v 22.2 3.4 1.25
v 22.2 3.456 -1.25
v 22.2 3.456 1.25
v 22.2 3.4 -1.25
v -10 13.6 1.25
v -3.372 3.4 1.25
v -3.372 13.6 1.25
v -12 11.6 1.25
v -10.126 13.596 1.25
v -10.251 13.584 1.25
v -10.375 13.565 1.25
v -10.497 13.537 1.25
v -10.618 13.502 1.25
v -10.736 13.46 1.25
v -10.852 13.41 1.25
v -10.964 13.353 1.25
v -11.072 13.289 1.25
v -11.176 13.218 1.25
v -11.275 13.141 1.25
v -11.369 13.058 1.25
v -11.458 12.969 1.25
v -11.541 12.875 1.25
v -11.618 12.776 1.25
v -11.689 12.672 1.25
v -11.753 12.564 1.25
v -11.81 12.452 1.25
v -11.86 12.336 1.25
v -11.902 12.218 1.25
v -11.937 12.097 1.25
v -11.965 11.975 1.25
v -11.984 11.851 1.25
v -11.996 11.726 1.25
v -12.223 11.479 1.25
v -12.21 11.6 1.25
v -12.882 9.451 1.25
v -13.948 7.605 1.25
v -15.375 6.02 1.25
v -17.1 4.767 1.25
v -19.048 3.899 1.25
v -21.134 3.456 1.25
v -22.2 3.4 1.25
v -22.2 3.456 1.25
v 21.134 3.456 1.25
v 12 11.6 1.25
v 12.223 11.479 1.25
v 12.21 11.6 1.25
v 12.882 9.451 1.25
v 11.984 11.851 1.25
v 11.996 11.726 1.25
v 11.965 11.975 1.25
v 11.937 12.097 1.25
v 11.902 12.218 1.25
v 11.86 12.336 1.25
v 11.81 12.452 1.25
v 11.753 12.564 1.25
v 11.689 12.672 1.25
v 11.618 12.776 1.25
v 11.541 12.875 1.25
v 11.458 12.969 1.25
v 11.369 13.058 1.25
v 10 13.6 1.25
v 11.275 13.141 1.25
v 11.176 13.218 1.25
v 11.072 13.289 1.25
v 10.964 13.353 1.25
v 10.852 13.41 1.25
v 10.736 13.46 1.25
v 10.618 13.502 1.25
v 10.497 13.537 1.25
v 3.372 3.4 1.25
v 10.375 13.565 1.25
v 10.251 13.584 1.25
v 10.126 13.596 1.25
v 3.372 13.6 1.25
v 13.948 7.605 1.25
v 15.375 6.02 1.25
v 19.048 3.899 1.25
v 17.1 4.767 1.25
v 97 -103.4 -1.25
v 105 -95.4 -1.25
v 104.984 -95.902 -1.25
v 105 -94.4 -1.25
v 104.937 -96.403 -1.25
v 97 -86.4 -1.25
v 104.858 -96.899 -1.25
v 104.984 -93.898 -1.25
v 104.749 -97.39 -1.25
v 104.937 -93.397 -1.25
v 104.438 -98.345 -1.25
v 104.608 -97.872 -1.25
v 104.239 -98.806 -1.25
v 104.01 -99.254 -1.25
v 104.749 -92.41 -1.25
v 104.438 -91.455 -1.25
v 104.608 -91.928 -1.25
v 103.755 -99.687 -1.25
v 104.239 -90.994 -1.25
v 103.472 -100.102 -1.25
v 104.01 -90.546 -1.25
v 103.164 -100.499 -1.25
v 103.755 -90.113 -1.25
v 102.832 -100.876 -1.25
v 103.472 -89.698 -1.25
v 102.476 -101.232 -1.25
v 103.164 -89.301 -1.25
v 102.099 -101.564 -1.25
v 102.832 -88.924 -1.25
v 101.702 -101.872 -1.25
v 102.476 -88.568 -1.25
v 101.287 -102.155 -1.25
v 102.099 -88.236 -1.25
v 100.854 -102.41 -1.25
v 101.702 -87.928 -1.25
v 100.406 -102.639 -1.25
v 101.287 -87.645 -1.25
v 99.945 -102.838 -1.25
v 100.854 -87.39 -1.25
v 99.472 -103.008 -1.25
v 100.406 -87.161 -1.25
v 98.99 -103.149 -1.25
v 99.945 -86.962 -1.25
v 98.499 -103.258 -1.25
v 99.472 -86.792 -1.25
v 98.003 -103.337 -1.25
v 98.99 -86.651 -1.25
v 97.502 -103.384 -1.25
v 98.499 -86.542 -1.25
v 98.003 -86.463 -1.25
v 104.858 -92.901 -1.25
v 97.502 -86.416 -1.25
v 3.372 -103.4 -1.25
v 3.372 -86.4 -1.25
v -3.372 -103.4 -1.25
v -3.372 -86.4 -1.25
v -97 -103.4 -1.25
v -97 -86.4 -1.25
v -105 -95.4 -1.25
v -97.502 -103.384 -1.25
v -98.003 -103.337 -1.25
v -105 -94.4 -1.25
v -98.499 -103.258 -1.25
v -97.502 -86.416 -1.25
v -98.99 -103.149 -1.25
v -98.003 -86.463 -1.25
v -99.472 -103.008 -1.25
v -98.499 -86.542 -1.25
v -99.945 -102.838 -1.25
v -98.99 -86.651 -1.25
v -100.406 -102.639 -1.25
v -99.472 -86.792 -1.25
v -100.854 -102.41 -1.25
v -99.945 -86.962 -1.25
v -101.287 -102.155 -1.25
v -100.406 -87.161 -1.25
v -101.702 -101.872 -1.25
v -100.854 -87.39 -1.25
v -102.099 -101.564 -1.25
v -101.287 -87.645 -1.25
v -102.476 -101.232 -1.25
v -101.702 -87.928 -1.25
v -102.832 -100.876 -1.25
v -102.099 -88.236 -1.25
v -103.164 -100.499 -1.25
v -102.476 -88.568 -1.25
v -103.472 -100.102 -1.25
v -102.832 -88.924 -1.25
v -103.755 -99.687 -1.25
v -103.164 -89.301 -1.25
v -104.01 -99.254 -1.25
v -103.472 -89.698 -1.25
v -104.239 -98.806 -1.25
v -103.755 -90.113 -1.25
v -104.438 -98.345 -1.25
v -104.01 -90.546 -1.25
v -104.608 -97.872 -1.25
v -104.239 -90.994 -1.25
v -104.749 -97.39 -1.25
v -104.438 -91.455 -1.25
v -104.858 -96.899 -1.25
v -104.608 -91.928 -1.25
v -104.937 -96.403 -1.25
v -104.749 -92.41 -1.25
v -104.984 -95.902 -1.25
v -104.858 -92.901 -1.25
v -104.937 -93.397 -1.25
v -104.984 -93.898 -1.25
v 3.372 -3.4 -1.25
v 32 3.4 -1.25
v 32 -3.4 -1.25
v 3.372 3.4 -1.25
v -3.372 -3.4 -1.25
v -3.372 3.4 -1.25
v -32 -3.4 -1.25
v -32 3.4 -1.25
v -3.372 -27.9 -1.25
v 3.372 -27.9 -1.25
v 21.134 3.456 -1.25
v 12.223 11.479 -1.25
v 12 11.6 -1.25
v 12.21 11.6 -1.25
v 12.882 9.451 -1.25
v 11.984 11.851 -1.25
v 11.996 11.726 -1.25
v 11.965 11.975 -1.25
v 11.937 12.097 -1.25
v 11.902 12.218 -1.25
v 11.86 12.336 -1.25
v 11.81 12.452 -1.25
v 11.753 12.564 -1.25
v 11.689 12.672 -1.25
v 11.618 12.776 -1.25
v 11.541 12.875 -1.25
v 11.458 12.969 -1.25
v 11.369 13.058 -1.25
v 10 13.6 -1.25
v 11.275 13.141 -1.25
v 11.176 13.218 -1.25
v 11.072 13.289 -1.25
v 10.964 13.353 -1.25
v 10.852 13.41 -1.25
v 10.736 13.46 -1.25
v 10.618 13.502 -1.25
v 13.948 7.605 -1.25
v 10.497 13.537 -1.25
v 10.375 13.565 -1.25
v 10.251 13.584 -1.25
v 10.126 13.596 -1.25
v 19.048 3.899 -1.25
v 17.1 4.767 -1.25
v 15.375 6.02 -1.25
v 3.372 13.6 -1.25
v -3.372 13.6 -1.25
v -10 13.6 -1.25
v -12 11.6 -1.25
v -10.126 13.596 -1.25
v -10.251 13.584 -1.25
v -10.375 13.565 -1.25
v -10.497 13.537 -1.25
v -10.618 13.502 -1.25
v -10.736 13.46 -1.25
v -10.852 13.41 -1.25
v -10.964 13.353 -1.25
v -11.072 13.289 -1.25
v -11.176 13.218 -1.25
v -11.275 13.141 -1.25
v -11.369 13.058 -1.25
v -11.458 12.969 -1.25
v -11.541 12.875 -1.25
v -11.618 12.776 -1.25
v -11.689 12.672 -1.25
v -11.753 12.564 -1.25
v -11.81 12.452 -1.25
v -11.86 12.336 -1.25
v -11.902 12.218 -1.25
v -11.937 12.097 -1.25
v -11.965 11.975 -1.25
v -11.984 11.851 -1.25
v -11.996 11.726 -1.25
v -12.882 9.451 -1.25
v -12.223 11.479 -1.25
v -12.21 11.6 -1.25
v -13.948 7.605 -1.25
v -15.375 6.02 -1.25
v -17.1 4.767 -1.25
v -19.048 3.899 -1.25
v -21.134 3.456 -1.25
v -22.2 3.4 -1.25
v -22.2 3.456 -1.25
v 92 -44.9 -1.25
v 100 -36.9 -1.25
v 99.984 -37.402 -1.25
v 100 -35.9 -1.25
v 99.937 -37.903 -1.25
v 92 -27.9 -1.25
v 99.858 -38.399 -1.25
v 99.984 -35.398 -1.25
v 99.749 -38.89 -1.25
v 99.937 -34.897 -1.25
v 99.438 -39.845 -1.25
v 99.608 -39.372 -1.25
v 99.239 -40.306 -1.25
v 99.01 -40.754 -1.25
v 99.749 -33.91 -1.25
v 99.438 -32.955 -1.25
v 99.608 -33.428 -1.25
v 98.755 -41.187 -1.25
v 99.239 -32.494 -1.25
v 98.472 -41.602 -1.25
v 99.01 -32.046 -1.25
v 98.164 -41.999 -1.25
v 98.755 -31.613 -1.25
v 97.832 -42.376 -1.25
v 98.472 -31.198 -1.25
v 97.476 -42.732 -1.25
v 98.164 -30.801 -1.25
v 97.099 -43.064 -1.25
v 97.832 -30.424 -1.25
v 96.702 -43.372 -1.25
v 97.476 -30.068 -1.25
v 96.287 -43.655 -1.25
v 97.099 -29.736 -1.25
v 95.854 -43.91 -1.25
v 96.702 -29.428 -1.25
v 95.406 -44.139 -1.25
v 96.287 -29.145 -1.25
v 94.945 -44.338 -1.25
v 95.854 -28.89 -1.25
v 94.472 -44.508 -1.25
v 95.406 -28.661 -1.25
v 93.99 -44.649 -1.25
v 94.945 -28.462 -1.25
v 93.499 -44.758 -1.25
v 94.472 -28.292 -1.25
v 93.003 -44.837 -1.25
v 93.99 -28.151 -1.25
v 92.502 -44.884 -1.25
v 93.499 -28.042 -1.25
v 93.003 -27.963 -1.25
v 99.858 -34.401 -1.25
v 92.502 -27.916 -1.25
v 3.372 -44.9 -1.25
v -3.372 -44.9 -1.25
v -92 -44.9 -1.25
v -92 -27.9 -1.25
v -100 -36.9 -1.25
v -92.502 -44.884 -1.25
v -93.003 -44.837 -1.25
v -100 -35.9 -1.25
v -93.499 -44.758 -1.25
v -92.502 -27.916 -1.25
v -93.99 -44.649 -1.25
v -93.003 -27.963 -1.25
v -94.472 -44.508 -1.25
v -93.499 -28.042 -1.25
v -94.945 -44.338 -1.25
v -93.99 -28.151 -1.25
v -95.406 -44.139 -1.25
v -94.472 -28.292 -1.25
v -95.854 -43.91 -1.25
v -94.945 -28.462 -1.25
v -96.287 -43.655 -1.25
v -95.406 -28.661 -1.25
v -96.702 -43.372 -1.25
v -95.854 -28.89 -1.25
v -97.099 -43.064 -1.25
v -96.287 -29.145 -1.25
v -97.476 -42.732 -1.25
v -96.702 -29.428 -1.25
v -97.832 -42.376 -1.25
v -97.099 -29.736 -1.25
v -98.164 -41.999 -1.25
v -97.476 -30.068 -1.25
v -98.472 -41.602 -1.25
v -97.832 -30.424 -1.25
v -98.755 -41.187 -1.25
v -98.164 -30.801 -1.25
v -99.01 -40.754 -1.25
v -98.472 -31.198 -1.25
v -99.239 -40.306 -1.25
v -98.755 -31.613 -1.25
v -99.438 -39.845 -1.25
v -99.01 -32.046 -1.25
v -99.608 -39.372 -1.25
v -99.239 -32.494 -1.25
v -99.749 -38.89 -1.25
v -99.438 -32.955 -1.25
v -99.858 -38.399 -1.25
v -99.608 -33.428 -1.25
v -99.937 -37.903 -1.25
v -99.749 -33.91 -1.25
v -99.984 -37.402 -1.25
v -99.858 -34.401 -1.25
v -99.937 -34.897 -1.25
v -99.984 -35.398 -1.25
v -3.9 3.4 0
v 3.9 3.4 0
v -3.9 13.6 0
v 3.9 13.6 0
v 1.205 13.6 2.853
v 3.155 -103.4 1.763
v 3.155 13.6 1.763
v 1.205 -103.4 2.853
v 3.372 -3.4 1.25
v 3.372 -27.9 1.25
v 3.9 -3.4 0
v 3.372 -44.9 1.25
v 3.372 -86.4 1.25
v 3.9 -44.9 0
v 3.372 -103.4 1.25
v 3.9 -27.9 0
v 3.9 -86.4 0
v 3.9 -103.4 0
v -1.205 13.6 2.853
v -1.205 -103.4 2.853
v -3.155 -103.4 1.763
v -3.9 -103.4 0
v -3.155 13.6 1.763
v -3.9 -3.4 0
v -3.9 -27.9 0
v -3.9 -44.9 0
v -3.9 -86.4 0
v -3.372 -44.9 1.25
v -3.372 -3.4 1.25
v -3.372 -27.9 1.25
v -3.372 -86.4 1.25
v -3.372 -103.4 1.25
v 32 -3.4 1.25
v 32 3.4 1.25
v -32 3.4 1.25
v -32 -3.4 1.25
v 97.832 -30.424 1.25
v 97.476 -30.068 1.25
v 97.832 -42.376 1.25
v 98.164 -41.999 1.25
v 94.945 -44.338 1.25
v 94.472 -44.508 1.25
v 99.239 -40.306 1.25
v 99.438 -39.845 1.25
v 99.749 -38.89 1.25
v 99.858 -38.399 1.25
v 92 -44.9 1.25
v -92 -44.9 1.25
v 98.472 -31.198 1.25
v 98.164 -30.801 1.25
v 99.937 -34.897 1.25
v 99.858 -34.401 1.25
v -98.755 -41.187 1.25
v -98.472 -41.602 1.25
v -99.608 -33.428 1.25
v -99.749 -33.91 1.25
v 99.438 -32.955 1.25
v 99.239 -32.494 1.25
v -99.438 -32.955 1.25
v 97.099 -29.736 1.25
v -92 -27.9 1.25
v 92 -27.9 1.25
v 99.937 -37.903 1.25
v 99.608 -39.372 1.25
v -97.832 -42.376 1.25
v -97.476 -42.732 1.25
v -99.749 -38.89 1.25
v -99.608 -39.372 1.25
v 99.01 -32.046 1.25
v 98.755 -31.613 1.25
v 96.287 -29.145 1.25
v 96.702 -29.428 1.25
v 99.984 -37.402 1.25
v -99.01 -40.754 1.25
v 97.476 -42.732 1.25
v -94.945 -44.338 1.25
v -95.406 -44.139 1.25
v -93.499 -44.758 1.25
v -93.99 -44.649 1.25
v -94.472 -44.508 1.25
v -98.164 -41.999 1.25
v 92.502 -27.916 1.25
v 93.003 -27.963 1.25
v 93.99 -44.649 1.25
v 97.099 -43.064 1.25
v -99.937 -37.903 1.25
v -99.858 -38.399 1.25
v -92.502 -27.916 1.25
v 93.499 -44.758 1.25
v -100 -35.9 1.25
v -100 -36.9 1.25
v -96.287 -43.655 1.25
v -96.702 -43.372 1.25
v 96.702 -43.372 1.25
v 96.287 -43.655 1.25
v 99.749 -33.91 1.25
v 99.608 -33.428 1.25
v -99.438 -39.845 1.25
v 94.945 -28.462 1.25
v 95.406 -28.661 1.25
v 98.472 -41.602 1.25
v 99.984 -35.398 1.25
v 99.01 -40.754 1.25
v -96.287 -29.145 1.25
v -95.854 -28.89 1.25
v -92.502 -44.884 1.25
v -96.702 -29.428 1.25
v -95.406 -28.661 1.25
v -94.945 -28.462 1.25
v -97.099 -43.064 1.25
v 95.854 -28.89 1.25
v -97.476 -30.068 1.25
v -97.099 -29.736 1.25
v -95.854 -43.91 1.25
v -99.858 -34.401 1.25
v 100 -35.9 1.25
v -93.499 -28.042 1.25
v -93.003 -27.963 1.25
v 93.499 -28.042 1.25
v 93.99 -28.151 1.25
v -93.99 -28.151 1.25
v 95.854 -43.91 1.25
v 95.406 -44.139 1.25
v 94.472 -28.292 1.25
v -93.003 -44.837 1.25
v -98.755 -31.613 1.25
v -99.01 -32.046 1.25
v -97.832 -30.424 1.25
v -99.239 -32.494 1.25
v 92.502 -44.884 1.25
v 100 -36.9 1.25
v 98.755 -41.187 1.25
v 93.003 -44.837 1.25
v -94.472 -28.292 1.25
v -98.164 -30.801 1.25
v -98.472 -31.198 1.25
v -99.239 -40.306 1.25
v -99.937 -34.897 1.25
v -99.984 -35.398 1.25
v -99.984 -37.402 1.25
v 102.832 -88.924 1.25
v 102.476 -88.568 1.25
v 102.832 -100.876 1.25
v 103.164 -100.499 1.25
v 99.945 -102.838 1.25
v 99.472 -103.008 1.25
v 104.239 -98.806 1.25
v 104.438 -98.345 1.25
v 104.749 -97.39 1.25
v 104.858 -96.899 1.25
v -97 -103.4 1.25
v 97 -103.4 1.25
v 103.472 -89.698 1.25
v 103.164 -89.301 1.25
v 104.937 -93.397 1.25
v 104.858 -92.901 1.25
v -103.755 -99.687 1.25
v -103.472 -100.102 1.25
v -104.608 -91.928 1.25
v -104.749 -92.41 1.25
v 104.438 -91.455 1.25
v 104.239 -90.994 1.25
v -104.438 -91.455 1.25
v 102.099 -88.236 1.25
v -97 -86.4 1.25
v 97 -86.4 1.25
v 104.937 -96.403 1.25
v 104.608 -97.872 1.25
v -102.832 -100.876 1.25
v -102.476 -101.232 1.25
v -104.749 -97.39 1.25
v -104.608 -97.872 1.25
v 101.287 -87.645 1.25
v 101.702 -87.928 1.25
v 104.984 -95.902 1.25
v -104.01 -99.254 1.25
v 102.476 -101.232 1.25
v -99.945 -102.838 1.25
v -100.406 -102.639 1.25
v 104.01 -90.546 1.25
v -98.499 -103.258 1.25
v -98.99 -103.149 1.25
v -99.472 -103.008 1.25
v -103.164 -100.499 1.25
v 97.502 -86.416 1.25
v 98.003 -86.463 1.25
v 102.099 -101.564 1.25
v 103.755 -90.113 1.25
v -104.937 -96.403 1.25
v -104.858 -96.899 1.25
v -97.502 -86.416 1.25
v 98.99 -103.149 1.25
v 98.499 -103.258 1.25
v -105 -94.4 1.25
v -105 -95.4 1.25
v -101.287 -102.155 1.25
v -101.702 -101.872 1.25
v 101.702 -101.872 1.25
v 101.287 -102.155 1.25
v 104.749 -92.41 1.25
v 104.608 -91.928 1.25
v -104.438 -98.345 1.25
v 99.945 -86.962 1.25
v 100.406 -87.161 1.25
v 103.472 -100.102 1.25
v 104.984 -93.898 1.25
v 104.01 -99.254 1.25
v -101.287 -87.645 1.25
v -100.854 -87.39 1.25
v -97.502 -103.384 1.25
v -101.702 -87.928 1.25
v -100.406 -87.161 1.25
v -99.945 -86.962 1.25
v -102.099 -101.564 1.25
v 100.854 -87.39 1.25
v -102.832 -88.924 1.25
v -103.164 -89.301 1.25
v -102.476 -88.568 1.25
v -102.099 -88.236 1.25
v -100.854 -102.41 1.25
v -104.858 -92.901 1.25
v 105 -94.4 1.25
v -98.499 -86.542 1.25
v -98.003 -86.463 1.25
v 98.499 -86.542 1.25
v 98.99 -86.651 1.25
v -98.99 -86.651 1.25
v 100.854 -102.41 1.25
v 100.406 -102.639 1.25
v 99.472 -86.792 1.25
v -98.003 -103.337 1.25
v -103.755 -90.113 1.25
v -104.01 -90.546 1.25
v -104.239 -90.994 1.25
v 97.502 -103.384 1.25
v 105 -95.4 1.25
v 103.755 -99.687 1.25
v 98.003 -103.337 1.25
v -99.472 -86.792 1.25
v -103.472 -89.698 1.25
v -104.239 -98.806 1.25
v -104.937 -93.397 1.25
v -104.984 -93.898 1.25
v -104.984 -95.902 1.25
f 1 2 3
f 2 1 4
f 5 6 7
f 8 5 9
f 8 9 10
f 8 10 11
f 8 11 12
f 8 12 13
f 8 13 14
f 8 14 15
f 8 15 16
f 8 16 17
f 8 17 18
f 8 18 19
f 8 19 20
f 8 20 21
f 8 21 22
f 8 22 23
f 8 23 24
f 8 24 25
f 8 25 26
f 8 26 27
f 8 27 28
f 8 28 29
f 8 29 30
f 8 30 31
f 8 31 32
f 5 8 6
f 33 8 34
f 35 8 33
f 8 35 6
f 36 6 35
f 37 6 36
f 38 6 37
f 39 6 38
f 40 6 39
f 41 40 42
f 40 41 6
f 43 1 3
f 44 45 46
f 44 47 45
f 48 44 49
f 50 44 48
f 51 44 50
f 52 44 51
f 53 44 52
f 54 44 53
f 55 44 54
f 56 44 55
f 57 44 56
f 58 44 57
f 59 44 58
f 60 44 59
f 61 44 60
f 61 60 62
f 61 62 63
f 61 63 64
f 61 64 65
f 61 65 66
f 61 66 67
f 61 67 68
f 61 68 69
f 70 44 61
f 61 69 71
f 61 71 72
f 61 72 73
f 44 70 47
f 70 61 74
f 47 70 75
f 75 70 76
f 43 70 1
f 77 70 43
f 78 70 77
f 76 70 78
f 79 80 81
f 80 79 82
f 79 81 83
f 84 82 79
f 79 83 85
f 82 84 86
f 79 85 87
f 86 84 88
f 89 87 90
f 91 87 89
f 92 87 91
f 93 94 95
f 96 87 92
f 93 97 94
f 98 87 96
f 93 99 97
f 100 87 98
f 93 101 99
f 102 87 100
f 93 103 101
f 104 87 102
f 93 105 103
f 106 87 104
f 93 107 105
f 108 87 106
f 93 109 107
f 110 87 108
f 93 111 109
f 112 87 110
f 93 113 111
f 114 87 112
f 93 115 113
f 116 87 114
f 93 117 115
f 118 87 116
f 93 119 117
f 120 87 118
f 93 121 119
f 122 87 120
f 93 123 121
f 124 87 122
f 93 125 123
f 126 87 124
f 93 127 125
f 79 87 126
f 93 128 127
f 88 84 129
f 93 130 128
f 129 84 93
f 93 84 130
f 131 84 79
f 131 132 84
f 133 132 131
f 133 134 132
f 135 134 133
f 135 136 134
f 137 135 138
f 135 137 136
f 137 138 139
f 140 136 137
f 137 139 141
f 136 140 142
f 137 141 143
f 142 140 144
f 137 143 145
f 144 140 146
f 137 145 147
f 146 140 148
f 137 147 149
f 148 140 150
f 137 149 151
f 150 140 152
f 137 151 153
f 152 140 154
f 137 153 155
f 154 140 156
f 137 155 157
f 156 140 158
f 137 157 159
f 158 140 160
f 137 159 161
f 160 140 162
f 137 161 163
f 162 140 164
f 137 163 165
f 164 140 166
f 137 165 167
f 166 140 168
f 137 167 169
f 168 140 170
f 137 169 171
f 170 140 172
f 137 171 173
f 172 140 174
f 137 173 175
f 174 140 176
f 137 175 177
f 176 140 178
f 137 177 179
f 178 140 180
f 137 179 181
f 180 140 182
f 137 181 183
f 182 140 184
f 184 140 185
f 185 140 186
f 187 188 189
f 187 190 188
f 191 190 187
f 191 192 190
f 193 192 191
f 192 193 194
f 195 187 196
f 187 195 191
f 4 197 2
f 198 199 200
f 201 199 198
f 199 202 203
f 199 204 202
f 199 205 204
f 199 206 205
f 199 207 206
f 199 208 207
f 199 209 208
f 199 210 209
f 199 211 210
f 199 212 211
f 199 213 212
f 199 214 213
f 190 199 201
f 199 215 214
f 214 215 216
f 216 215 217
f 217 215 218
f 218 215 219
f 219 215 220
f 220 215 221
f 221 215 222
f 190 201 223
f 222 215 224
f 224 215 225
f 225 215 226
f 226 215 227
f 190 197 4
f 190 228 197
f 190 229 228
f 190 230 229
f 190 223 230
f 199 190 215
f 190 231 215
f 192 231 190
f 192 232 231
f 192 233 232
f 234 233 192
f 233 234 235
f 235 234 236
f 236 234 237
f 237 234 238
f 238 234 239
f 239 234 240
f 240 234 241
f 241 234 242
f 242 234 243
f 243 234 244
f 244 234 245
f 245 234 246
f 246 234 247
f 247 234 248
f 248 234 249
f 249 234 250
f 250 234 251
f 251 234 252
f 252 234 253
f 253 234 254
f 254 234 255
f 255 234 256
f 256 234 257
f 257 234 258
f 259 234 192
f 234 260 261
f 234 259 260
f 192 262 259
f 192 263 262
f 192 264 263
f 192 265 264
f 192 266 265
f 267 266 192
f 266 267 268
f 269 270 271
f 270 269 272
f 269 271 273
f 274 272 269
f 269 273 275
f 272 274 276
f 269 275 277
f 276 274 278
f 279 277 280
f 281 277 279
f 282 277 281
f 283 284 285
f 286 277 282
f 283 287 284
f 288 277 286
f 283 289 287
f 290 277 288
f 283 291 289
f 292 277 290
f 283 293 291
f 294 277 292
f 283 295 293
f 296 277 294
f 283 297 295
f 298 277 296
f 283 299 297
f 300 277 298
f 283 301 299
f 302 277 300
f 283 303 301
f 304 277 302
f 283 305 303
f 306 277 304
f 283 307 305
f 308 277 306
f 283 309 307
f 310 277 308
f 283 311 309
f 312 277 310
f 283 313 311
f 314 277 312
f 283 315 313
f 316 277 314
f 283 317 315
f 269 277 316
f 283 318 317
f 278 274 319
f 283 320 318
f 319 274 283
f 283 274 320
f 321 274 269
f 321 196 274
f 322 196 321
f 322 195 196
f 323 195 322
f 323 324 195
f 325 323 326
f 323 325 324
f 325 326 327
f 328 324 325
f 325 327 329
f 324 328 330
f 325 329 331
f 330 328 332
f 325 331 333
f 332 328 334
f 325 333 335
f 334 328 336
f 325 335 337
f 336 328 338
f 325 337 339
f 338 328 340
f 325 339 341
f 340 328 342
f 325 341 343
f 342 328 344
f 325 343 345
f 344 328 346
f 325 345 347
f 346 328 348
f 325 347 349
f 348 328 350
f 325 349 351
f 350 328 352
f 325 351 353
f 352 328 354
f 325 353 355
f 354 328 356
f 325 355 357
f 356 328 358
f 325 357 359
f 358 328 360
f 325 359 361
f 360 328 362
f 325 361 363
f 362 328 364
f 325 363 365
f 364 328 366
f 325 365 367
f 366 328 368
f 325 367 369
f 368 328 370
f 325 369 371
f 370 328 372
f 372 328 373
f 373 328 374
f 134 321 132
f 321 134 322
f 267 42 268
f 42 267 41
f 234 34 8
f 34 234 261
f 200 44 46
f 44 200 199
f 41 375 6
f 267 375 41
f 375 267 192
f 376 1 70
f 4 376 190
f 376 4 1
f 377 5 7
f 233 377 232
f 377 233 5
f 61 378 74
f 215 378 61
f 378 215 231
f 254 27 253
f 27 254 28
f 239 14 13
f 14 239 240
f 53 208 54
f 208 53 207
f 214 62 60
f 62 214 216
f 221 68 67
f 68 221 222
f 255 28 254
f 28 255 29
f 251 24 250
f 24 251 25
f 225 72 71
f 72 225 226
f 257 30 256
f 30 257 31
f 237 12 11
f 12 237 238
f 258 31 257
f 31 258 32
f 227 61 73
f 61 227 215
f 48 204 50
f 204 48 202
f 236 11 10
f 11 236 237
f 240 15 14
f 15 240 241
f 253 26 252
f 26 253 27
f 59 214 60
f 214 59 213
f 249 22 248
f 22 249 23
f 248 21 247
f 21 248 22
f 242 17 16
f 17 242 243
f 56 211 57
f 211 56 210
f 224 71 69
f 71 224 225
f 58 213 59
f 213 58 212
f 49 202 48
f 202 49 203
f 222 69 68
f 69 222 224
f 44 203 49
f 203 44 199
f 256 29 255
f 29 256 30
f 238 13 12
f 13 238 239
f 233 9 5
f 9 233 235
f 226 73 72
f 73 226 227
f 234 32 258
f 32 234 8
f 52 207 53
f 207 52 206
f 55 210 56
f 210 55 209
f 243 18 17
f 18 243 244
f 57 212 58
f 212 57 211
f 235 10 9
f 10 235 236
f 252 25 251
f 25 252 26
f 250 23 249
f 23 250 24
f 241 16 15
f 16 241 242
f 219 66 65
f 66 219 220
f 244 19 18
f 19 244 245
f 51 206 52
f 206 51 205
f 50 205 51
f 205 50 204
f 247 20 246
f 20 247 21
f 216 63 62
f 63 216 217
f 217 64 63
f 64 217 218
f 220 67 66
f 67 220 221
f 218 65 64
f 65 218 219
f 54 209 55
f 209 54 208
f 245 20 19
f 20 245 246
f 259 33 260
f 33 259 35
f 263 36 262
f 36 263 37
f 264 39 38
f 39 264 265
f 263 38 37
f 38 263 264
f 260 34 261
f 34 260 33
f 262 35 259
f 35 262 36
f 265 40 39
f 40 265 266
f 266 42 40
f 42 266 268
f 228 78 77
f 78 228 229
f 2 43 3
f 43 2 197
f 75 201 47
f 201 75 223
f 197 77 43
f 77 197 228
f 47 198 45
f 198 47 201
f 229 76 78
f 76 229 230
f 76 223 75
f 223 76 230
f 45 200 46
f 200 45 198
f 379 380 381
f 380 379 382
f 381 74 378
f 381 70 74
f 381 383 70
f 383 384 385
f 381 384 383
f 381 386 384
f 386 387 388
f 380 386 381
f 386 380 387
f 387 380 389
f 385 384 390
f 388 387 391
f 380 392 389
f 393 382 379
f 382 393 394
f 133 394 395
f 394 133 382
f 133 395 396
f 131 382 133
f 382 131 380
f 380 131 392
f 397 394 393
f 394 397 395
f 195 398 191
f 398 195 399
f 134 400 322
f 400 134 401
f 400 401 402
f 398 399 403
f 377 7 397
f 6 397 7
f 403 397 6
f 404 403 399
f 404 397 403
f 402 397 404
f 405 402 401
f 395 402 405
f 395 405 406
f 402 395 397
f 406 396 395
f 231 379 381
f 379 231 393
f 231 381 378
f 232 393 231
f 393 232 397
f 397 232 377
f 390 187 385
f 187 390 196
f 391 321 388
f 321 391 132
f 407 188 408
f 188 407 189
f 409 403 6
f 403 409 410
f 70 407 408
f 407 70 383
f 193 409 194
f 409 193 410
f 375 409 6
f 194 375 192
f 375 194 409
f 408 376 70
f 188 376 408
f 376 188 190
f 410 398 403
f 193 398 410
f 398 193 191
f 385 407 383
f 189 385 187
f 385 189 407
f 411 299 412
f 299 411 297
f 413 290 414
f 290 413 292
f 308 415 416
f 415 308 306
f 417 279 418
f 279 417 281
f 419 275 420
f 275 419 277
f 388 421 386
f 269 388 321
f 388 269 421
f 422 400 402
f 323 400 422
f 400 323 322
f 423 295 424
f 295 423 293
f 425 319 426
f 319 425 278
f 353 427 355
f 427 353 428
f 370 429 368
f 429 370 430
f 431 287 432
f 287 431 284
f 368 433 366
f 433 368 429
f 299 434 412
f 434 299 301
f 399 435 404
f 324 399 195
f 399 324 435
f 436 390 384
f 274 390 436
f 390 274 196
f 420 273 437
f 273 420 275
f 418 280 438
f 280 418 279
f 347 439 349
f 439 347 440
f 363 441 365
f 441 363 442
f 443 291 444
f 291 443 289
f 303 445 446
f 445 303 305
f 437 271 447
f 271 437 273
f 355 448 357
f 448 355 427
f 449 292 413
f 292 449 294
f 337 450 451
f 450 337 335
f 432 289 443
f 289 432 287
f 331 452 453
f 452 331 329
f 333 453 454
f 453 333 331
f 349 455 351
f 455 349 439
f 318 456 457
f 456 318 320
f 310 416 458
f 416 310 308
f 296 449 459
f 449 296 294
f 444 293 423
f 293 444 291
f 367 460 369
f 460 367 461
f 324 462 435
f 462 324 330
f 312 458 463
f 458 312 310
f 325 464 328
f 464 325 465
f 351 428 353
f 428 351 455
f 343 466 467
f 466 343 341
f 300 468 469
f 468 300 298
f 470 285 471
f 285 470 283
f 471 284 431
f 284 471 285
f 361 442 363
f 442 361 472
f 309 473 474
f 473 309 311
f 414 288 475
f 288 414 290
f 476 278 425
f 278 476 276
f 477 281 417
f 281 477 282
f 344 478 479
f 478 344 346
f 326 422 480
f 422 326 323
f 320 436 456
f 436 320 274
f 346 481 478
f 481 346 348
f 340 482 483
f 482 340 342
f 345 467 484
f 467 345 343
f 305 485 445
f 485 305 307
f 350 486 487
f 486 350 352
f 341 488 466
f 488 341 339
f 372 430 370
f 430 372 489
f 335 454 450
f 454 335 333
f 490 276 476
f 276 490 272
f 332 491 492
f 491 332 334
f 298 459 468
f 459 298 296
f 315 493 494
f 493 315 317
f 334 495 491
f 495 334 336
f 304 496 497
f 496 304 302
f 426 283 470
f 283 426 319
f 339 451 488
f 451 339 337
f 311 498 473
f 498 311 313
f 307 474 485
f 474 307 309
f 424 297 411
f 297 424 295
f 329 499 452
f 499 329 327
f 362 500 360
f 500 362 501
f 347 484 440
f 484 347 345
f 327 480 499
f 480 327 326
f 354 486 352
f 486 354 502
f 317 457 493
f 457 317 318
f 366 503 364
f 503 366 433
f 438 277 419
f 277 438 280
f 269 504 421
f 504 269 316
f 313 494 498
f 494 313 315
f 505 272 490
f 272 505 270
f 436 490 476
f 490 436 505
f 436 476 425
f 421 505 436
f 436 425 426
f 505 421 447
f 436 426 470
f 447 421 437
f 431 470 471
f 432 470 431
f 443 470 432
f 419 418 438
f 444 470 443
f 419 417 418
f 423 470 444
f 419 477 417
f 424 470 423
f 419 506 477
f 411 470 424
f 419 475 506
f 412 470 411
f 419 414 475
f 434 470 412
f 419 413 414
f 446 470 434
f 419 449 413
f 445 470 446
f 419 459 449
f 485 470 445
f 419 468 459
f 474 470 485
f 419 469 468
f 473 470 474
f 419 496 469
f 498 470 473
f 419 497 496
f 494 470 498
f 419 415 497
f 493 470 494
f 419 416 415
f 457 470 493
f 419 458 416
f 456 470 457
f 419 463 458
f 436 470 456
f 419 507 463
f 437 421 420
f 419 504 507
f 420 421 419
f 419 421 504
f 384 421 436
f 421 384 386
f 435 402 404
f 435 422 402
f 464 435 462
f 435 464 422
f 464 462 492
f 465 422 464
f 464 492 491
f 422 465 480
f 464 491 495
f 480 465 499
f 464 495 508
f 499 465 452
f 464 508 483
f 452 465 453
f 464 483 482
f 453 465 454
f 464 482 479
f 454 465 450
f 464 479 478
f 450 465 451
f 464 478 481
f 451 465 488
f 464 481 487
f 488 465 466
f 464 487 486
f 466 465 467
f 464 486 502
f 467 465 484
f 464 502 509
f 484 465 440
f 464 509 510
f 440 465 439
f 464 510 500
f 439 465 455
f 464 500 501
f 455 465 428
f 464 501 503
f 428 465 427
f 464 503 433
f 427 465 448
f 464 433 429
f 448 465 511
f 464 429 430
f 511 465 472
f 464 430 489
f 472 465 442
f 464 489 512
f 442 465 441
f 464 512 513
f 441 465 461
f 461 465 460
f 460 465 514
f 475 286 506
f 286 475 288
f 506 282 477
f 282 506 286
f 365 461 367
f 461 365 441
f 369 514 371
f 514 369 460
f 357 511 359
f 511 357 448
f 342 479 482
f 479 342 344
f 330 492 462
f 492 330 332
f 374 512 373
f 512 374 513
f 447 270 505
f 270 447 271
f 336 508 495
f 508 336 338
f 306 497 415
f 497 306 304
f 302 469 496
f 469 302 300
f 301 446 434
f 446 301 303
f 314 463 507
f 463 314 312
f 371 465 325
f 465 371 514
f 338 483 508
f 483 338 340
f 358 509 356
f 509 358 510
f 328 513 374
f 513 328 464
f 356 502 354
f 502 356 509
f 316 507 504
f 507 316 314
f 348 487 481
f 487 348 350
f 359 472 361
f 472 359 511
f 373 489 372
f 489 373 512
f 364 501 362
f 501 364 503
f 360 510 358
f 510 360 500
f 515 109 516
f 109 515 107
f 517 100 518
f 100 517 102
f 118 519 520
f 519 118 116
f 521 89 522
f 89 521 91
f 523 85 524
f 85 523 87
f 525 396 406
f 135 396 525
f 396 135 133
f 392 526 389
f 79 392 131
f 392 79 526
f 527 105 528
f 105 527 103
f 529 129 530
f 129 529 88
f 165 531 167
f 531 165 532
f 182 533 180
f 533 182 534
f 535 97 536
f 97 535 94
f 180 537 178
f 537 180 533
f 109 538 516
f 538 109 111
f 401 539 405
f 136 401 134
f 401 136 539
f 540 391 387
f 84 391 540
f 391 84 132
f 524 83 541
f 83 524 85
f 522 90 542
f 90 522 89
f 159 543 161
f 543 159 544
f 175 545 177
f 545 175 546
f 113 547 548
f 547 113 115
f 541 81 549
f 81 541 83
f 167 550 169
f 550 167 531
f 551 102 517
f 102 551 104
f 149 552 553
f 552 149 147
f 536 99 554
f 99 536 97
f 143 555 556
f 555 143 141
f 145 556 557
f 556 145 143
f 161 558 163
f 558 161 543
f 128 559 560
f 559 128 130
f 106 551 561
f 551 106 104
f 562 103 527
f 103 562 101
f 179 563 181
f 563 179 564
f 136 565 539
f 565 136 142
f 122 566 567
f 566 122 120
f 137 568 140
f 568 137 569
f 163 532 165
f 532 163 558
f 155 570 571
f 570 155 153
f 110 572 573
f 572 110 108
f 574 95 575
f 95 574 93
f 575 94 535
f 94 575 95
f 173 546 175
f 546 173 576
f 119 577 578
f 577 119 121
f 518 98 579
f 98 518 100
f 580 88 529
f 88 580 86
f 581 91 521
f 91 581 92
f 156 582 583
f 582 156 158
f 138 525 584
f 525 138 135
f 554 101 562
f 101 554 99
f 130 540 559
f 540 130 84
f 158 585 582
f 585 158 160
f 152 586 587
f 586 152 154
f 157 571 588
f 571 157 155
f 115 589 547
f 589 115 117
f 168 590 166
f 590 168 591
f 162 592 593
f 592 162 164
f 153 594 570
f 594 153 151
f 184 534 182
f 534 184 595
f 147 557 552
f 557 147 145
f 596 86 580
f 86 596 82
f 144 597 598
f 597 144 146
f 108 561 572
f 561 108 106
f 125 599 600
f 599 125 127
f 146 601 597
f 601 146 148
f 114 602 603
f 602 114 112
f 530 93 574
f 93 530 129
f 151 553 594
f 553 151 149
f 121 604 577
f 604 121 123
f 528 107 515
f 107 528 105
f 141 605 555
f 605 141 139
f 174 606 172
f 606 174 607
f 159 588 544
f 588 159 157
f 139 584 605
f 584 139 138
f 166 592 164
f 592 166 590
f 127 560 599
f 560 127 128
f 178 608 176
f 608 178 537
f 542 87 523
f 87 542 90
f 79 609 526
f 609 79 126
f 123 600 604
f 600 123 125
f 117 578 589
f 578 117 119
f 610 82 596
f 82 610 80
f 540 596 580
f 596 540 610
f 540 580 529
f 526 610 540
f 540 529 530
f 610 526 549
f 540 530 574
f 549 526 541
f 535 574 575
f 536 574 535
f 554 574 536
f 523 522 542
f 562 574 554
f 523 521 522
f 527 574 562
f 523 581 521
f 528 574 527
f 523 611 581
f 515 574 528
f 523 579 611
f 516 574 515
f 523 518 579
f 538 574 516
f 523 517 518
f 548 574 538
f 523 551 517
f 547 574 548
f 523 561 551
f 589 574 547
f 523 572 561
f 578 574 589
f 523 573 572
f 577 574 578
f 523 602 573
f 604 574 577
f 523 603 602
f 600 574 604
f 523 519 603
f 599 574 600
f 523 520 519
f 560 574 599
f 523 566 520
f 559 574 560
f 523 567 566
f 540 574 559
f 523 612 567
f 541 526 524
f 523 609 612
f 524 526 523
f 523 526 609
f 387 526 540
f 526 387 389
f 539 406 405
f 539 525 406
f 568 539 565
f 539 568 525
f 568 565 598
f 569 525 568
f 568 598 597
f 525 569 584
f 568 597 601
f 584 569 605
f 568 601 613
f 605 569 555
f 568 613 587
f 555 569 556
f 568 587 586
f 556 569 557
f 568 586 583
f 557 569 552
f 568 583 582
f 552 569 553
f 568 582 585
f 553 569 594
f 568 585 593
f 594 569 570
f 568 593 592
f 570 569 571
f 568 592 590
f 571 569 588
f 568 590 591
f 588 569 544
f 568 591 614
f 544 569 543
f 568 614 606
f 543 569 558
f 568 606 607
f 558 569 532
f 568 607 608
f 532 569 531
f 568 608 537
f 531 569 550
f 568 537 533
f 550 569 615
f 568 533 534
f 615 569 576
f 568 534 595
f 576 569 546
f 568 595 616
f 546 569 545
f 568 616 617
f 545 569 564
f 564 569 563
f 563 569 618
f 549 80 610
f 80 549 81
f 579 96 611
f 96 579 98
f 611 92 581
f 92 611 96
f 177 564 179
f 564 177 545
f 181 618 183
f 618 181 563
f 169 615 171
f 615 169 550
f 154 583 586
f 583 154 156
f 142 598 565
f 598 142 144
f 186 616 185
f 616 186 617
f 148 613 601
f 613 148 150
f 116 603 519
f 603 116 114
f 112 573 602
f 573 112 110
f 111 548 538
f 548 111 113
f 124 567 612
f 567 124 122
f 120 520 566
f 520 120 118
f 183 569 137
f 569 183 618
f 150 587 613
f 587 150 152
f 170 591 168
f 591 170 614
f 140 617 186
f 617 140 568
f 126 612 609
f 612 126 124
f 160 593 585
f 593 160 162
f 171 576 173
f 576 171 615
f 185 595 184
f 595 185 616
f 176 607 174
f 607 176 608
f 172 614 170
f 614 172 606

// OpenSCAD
/* [Parameters] */
tip_perimeter=64;
tip_width=17;

mid_perimeter=200;
mid_width=17;

bottom_perimeter=210;
bottom_width=17;

distance_tip_mid=24.5;
distance_mid_bottom=41.5;

thickness=2.5;

/* [Hidden] */
e=thickness;
r=8;
r2=2;
tfp=tip_perimeter;
tfw=tip_width;

mp=mid_perimeter;
mw=mid_width;

bp=bottom_perimeter;
bw=bottom_width;

dtm=distance_tip_mid;
dmb=distance_mid_bottom;

//modulos
module cubox(l1,w1,e1,r1){
hull(){
translate([l1/2-r1,w1/2-r1,0]){
cylinder(e1,r1,r1,$fn=100, center=true);
}
translate([l1/2-r1,-w1/2+r1,0]){
cylinder(e1,r1,r1,$fn=100, center=true);
}
translate([-l1/2+r1,-w1/2+r1,0]){
cylinder(e1,r1,r1,$fn=100, center=true);
}
translate([-l1/2+r1,w1/2-r1,0]){
cylinder(e1,r1,r1,$fn=100, center=true);

}
}
}


//TIP
cube(size=[tfp,tfw*0.4,e] , center=true);

difference() {
translate([0,tfw*0.5-r2/2,0]){
union(){
cube(size=[tfp*0.375+2*tfw*0.6,tfw*0.6-r2,e] , center=true);
translate([0,r2/2,0]){
cubox(tfp*0.375,tfw*0.6,e  ,r2);
}
}
}
    union() {
    translate([-(tfp*0.375/2+tfw*0.6),tfw*0.8,0]){
    cylinder(e+2,tfw*0.6,tfw*0.6, center=true);
    }
   translate([tfp*0.375/2+tfw*0.6,tfw*0.8,0]){
    cylinder(e+2,tfw*0.6,tfw*0.6, center=true);
    } 
    }

}

//MIDDLE
dtm2=dtm+0.4*tfw/2+mw/2;
translate([0,-dtm2,0]){  
cubox(mp,mw,e,r);
}

//BOTTOM
dmb2=dmb+bw/2+mw/2;
translate([0,-dtm2-dmb2,0]){  
cubox(bp,bw,e,r);
}

//union
cl=tfw+dtm+mw+dmb+bw;
translate([0,-cl/2+tfw*0.8,0]){
difference() { 
rotate([90,0,0]){ 
scale([1.3,1,1]){
cylinder(cl,3,3, center=true);
}
}
translate([0,0,-(10+e)/2]){ 
cube(size=[10,cl+10,10] , center=true);
}
}
}
